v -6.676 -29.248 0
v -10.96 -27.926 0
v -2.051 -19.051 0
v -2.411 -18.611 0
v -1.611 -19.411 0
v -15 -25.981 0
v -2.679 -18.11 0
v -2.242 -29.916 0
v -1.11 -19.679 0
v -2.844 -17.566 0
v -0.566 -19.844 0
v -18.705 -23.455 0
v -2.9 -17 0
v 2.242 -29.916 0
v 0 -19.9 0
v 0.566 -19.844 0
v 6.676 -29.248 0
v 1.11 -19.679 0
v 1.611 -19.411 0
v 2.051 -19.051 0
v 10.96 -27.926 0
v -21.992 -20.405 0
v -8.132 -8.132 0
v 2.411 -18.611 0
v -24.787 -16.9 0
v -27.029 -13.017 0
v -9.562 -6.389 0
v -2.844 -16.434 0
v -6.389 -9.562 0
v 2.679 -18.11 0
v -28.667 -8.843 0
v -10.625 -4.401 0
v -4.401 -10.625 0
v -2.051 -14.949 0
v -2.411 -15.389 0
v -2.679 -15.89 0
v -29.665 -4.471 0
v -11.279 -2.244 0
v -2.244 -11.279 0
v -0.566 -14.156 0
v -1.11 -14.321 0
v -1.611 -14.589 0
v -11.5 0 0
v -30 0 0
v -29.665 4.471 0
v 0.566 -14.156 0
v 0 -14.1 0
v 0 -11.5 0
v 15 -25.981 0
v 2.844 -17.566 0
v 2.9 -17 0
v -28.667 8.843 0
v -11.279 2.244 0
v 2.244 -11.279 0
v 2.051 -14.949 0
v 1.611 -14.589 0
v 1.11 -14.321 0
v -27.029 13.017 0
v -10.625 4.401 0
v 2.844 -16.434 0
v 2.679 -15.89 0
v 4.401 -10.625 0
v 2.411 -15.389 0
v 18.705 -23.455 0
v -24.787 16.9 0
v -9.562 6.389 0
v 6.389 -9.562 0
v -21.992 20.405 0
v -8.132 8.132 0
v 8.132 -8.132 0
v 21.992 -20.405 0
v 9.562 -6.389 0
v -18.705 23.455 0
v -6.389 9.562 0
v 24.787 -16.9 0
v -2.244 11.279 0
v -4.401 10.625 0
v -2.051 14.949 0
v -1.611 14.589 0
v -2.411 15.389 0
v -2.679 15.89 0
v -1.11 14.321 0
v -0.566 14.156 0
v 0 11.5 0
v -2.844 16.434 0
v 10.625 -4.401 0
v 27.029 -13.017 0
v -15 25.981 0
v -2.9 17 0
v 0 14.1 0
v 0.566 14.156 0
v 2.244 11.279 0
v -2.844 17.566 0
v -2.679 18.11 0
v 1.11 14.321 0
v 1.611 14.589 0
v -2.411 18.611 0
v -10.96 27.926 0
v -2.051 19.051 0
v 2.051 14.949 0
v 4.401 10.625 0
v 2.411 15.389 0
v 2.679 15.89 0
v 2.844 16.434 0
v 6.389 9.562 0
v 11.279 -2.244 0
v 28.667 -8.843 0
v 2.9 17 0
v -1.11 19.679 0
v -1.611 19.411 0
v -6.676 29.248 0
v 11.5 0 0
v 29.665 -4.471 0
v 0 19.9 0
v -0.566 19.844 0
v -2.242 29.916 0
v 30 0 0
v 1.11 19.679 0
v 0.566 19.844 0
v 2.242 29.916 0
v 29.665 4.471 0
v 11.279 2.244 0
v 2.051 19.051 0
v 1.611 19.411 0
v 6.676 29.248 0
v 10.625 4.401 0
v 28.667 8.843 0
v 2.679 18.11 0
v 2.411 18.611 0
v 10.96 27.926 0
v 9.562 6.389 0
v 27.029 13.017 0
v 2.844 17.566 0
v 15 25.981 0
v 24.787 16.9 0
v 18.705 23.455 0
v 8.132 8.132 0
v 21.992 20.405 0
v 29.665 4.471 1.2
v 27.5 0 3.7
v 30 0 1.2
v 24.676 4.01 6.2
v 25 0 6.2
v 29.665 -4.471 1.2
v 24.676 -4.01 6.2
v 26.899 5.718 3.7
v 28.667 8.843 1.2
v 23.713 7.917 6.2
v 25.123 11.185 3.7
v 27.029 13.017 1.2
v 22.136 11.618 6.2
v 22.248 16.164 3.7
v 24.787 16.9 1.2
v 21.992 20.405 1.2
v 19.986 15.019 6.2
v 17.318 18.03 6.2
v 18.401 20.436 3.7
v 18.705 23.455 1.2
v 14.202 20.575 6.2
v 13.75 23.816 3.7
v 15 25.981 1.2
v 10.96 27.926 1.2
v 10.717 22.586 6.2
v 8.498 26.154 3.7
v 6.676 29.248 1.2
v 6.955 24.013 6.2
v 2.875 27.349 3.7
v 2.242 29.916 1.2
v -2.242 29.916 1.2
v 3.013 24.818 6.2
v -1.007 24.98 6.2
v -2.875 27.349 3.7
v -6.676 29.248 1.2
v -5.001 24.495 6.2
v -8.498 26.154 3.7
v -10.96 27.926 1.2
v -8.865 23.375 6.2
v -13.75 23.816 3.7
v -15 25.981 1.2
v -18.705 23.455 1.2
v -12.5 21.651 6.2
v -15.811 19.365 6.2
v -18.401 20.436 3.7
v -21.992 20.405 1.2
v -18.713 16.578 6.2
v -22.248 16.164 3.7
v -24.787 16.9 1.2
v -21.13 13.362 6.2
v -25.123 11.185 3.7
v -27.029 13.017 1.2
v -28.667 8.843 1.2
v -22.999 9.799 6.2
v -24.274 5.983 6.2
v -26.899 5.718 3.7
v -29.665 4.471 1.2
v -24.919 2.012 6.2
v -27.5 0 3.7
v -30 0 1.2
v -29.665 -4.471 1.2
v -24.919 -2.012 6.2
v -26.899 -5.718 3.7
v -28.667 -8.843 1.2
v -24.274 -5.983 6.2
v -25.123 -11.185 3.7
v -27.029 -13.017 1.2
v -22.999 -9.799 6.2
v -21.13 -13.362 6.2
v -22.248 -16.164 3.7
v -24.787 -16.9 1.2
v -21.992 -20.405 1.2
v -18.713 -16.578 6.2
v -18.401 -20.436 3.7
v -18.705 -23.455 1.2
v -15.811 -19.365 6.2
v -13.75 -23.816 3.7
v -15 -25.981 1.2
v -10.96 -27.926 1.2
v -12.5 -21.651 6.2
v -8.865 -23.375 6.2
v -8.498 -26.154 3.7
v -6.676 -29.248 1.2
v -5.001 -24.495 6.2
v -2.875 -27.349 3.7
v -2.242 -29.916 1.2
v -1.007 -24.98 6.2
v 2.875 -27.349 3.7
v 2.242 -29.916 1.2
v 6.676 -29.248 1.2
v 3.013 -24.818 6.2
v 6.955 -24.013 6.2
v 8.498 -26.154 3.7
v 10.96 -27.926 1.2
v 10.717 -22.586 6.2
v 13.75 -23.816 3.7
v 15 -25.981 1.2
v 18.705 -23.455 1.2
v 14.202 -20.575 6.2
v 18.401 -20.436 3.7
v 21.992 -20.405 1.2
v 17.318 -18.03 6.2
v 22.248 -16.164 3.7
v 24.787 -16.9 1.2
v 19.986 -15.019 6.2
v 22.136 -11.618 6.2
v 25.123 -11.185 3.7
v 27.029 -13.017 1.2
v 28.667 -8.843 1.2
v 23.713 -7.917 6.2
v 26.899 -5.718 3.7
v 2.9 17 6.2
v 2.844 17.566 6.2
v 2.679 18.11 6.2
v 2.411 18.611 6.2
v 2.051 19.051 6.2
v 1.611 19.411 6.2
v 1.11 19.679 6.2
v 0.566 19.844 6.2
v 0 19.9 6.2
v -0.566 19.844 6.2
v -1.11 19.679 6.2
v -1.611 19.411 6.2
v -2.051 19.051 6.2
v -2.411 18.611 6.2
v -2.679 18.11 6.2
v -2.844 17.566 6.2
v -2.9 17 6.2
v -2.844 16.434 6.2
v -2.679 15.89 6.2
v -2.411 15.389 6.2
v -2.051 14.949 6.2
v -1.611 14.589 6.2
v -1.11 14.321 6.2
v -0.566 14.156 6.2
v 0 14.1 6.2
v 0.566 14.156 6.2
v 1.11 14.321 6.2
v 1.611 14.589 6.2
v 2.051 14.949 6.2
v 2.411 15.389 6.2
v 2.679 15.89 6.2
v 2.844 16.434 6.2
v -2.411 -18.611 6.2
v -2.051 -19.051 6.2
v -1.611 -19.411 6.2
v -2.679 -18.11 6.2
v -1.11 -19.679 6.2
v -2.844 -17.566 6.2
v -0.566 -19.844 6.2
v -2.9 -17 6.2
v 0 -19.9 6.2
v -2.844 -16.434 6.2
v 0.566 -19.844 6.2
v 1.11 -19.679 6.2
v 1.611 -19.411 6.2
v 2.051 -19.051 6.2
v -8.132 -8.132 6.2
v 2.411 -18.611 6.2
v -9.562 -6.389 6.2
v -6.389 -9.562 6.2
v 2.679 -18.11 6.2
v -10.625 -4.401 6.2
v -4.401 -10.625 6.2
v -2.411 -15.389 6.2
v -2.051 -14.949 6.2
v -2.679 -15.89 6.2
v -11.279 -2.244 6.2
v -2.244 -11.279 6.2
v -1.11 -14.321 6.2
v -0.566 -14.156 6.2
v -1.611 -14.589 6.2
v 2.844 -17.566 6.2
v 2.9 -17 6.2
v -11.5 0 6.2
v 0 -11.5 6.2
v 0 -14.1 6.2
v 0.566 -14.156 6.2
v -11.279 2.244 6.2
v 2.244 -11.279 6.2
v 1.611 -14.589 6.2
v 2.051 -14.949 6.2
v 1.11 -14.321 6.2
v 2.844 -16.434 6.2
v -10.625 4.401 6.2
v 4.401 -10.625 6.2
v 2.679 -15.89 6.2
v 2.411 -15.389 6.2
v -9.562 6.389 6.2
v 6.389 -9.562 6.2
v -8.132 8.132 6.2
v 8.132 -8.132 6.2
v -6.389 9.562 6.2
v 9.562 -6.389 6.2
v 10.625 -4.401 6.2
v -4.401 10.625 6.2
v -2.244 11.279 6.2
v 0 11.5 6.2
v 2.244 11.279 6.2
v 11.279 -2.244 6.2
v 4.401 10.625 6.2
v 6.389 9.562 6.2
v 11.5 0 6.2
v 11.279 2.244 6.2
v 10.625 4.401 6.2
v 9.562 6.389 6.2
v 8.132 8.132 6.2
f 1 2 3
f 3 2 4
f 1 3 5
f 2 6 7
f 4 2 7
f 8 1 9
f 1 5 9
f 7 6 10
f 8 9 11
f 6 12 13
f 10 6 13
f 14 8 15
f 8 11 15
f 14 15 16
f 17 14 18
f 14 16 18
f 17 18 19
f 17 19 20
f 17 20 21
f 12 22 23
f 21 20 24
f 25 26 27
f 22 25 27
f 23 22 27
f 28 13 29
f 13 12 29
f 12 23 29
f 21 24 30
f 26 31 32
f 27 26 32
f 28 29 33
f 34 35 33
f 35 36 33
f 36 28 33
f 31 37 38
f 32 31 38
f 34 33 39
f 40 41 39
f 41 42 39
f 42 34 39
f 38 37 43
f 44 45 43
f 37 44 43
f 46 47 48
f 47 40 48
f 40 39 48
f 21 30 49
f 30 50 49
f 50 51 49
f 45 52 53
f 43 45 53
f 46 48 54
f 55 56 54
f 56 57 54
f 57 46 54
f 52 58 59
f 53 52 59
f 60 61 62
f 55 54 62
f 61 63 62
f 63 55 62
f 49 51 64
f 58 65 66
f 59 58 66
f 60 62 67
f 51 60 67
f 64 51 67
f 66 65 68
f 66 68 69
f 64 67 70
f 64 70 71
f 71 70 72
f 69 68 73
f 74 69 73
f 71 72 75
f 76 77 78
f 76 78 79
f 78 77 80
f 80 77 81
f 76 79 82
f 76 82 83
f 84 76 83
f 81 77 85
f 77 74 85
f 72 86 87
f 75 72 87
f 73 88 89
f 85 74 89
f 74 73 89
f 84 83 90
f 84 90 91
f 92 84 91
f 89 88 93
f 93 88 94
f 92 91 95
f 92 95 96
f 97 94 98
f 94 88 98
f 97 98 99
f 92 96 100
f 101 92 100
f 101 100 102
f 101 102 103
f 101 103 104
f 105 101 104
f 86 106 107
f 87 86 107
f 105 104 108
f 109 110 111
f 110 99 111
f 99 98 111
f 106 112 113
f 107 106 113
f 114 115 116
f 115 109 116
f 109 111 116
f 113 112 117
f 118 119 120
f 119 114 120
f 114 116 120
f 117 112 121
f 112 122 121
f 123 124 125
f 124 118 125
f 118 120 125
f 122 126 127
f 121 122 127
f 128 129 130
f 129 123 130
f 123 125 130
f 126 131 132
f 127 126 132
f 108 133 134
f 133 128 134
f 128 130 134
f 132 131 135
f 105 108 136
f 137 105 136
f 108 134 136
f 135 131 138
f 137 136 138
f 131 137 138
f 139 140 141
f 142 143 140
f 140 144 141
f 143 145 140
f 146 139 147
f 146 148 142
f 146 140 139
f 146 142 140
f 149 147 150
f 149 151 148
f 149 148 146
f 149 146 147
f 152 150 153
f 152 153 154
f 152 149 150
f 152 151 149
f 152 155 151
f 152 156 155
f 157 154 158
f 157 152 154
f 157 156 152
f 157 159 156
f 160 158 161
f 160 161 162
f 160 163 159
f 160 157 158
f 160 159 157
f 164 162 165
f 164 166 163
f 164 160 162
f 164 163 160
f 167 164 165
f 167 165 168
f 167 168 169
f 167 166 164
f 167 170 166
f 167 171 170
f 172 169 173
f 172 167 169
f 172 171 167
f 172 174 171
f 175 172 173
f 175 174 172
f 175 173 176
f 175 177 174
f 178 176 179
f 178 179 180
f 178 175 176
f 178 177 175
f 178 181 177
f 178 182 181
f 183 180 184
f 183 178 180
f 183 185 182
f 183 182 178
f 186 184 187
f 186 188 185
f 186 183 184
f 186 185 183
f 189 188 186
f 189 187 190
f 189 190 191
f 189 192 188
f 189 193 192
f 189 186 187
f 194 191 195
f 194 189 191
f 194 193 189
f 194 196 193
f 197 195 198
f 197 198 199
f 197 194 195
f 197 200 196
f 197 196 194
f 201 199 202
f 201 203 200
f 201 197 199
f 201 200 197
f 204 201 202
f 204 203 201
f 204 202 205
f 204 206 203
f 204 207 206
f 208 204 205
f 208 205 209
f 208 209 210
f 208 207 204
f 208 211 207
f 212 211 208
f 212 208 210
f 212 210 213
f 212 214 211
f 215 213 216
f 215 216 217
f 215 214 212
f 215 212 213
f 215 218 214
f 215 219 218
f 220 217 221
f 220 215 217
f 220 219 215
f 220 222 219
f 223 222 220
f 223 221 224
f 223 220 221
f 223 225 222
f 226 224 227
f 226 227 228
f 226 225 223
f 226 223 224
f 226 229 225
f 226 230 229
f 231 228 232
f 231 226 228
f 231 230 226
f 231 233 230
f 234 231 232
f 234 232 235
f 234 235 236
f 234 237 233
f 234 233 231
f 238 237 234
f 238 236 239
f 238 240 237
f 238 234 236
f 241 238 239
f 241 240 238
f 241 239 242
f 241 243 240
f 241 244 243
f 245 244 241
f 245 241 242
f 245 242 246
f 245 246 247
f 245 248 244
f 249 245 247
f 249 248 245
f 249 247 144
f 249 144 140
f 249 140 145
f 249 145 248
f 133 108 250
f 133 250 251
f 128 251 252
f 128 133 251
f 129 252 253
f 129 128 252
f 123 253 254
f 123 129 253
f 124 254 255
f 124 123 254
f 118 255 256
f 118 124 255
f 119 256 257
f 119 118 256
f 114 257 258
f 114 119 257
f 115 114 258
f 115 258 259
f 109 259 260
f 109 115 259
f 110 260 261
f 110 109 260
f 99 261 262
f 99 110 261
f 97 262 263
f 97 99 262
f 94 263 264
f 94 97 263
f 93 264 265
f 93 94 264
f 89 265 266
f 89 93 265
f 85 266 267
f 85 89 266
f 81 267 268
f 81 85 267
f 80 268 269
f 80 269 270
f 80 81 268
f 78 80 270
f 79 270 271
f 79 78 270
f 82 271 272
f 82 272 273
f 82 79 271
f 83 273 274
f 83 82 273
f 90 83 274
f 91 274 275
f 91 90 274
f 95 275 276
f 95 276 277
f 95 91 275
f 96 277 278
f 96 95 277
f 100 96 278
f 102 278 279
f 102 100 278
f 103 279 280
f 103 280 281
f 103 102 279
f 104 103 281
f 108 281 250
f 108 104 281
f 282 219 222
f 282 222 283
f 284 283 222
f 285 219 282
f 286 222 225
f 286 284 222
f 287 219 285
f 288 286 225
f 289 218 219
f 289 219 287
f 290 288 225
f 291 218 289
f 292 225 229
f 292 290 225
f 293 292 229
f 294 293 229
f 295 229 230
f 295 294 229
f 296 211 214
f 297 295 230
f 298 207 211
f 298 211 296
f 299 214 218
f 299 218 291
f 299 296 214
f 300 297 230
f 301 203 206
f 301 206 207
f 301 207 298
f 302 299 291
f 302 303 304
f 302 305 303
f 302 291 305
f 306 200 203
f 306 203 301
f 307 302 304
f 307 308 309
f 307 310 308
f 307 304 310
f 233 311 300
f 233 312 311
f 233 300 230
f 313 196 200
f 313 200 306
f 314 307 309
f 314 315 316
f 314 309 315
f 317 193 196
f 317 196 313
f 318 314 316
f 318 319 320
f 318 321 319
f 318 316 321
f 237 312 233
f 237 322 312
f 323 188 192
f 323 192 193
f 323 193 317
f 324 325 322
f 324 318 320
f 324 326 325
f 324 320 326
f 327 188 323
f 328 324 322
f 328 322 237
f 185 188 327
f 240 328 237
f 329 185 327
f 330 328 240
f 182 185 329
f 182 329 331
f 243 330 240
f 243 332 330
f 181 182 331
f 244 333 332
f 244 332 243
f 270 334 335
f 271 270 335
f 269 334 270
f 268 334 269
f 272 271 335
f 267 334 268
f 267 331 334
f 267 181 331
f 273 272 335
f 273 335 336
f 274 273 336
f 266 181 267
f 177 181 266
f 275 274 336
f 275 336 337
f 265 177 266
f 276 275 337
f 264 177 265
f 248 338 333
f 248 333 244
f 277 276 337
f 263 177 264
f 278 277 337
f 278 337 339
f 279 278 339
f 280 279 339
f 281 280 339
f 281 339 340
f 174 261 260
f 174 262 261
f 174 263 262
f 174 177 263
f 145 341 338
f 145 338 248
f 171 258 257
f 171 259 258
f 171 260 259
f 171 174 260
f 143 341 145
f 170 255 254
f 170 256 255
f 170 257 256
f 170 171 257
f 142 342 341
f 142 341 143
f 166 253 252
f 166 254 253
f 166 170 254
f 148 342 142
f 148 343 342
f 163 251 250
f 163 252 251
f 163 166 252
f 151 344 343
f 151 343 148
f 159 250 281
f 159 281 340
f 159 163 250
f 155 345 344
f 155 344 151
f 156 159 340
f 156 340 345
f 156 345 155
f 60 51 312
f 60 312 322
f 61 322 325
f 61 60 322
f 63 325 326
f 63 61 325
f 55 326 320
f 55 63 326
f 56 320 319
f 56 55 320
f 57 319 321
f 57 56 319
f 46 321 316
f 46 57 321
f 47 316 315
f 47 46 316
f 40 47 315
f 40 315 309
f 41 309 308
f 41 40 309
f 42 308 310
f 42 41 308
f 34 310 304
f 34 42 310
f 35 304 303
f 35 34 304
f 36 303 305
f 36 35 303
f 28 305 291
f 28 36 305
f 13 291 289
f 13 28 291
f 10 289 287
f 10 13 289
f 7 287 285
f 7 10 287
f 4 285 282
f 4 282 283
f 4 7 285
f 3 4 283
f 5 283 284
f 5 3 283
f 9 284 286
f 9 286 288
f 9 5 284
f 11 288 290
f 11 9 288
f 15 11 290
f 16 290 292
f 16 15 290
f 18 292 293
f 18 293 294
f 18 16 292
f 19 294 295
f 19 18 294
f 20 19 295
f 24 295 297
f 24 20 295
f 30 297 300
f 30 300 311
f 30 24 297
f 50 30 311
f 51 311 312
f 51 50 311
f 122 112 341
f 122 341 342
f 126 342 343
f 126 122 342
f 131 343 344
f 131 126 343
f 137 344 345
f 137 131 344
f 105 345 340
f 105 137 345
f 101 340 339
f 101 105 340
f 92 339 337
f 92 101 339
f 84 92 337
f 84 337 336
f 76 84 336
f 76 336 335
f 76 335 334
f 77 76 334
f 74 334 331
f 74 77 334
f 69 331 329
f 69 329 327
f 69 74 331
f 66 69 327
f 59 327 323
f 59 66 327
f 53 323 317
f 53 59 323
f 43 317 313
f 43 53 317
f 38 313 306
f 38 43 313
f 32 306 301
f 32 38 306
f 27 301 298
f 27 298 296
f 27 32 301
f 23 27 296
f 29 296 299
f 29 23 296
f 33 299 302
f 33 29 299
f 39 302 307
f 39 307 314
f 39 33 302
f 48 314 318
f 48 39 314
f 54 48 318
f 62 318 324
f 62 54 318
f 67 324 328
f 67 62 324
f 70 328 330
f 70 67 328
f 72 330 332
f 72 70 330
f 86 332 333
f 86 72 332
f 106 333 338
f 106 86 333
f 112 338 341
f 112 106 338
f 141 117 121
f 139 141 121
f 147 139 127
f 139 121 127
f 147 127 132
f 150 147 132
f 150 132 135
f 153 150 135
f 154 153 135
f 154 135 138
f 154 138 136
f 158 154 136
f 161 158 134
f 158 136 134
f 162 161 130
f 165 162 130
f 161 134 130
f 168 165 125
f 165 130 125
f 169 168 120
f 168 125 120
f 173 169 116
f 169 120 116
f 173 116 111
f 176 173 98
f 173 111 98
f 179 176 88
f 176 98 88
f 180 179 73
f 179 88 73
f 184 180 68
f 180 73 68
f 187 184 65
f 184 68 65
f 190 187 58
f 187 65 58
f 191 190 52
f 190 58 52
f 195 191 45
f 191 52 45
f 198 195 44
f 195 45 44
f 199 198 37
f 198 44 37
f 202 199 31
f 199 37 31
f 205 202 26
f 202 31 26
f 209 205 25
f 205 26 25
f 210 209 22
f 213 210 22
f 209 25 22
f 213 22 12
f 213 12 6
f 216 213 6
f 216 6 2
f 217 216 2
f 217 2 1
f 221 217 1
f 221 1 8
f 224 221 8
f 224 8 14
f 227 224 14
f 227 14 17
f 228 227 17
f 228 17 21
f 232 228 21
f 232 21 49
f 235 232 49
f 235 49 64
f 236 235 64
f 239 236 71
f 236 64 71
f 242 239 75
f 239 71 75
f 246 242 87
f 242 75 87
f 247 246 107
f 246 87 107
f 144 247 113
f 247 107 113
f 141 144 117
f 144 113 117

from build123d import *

# Parameters (mm, degrees)
F0_R     = 30
F0_R_2   = 2.9
F0_R_3   = 11.5
F1_DEPTH = 6.2
F2_SIZE  = 5


with BuildPart() as f1:
    # F0 (on Top) → F1 (new body)
    with BuildSketch(Plane.XY):
        Circle(F0_R)
        with Locations((0, -17)):
            Circle(F0_R_2, mode=Mode.SUBTRACT)
        Circle(F0_R_3, mode=Mode.SUBTRACT)
        with Locations((0, 17)):
            Circle(F0_R_2, mode=Mode.SUBTRACT)
    extrude(amount=F1_DEPTH)

    # F2
    f2_edges = [f1.edges().sort_by_distance(p)[0] for p in [
        (-30, 0, 6.2),
    ]]
    chamfer(f2_edges, length=F2_SIZE)


solid = f1.part
